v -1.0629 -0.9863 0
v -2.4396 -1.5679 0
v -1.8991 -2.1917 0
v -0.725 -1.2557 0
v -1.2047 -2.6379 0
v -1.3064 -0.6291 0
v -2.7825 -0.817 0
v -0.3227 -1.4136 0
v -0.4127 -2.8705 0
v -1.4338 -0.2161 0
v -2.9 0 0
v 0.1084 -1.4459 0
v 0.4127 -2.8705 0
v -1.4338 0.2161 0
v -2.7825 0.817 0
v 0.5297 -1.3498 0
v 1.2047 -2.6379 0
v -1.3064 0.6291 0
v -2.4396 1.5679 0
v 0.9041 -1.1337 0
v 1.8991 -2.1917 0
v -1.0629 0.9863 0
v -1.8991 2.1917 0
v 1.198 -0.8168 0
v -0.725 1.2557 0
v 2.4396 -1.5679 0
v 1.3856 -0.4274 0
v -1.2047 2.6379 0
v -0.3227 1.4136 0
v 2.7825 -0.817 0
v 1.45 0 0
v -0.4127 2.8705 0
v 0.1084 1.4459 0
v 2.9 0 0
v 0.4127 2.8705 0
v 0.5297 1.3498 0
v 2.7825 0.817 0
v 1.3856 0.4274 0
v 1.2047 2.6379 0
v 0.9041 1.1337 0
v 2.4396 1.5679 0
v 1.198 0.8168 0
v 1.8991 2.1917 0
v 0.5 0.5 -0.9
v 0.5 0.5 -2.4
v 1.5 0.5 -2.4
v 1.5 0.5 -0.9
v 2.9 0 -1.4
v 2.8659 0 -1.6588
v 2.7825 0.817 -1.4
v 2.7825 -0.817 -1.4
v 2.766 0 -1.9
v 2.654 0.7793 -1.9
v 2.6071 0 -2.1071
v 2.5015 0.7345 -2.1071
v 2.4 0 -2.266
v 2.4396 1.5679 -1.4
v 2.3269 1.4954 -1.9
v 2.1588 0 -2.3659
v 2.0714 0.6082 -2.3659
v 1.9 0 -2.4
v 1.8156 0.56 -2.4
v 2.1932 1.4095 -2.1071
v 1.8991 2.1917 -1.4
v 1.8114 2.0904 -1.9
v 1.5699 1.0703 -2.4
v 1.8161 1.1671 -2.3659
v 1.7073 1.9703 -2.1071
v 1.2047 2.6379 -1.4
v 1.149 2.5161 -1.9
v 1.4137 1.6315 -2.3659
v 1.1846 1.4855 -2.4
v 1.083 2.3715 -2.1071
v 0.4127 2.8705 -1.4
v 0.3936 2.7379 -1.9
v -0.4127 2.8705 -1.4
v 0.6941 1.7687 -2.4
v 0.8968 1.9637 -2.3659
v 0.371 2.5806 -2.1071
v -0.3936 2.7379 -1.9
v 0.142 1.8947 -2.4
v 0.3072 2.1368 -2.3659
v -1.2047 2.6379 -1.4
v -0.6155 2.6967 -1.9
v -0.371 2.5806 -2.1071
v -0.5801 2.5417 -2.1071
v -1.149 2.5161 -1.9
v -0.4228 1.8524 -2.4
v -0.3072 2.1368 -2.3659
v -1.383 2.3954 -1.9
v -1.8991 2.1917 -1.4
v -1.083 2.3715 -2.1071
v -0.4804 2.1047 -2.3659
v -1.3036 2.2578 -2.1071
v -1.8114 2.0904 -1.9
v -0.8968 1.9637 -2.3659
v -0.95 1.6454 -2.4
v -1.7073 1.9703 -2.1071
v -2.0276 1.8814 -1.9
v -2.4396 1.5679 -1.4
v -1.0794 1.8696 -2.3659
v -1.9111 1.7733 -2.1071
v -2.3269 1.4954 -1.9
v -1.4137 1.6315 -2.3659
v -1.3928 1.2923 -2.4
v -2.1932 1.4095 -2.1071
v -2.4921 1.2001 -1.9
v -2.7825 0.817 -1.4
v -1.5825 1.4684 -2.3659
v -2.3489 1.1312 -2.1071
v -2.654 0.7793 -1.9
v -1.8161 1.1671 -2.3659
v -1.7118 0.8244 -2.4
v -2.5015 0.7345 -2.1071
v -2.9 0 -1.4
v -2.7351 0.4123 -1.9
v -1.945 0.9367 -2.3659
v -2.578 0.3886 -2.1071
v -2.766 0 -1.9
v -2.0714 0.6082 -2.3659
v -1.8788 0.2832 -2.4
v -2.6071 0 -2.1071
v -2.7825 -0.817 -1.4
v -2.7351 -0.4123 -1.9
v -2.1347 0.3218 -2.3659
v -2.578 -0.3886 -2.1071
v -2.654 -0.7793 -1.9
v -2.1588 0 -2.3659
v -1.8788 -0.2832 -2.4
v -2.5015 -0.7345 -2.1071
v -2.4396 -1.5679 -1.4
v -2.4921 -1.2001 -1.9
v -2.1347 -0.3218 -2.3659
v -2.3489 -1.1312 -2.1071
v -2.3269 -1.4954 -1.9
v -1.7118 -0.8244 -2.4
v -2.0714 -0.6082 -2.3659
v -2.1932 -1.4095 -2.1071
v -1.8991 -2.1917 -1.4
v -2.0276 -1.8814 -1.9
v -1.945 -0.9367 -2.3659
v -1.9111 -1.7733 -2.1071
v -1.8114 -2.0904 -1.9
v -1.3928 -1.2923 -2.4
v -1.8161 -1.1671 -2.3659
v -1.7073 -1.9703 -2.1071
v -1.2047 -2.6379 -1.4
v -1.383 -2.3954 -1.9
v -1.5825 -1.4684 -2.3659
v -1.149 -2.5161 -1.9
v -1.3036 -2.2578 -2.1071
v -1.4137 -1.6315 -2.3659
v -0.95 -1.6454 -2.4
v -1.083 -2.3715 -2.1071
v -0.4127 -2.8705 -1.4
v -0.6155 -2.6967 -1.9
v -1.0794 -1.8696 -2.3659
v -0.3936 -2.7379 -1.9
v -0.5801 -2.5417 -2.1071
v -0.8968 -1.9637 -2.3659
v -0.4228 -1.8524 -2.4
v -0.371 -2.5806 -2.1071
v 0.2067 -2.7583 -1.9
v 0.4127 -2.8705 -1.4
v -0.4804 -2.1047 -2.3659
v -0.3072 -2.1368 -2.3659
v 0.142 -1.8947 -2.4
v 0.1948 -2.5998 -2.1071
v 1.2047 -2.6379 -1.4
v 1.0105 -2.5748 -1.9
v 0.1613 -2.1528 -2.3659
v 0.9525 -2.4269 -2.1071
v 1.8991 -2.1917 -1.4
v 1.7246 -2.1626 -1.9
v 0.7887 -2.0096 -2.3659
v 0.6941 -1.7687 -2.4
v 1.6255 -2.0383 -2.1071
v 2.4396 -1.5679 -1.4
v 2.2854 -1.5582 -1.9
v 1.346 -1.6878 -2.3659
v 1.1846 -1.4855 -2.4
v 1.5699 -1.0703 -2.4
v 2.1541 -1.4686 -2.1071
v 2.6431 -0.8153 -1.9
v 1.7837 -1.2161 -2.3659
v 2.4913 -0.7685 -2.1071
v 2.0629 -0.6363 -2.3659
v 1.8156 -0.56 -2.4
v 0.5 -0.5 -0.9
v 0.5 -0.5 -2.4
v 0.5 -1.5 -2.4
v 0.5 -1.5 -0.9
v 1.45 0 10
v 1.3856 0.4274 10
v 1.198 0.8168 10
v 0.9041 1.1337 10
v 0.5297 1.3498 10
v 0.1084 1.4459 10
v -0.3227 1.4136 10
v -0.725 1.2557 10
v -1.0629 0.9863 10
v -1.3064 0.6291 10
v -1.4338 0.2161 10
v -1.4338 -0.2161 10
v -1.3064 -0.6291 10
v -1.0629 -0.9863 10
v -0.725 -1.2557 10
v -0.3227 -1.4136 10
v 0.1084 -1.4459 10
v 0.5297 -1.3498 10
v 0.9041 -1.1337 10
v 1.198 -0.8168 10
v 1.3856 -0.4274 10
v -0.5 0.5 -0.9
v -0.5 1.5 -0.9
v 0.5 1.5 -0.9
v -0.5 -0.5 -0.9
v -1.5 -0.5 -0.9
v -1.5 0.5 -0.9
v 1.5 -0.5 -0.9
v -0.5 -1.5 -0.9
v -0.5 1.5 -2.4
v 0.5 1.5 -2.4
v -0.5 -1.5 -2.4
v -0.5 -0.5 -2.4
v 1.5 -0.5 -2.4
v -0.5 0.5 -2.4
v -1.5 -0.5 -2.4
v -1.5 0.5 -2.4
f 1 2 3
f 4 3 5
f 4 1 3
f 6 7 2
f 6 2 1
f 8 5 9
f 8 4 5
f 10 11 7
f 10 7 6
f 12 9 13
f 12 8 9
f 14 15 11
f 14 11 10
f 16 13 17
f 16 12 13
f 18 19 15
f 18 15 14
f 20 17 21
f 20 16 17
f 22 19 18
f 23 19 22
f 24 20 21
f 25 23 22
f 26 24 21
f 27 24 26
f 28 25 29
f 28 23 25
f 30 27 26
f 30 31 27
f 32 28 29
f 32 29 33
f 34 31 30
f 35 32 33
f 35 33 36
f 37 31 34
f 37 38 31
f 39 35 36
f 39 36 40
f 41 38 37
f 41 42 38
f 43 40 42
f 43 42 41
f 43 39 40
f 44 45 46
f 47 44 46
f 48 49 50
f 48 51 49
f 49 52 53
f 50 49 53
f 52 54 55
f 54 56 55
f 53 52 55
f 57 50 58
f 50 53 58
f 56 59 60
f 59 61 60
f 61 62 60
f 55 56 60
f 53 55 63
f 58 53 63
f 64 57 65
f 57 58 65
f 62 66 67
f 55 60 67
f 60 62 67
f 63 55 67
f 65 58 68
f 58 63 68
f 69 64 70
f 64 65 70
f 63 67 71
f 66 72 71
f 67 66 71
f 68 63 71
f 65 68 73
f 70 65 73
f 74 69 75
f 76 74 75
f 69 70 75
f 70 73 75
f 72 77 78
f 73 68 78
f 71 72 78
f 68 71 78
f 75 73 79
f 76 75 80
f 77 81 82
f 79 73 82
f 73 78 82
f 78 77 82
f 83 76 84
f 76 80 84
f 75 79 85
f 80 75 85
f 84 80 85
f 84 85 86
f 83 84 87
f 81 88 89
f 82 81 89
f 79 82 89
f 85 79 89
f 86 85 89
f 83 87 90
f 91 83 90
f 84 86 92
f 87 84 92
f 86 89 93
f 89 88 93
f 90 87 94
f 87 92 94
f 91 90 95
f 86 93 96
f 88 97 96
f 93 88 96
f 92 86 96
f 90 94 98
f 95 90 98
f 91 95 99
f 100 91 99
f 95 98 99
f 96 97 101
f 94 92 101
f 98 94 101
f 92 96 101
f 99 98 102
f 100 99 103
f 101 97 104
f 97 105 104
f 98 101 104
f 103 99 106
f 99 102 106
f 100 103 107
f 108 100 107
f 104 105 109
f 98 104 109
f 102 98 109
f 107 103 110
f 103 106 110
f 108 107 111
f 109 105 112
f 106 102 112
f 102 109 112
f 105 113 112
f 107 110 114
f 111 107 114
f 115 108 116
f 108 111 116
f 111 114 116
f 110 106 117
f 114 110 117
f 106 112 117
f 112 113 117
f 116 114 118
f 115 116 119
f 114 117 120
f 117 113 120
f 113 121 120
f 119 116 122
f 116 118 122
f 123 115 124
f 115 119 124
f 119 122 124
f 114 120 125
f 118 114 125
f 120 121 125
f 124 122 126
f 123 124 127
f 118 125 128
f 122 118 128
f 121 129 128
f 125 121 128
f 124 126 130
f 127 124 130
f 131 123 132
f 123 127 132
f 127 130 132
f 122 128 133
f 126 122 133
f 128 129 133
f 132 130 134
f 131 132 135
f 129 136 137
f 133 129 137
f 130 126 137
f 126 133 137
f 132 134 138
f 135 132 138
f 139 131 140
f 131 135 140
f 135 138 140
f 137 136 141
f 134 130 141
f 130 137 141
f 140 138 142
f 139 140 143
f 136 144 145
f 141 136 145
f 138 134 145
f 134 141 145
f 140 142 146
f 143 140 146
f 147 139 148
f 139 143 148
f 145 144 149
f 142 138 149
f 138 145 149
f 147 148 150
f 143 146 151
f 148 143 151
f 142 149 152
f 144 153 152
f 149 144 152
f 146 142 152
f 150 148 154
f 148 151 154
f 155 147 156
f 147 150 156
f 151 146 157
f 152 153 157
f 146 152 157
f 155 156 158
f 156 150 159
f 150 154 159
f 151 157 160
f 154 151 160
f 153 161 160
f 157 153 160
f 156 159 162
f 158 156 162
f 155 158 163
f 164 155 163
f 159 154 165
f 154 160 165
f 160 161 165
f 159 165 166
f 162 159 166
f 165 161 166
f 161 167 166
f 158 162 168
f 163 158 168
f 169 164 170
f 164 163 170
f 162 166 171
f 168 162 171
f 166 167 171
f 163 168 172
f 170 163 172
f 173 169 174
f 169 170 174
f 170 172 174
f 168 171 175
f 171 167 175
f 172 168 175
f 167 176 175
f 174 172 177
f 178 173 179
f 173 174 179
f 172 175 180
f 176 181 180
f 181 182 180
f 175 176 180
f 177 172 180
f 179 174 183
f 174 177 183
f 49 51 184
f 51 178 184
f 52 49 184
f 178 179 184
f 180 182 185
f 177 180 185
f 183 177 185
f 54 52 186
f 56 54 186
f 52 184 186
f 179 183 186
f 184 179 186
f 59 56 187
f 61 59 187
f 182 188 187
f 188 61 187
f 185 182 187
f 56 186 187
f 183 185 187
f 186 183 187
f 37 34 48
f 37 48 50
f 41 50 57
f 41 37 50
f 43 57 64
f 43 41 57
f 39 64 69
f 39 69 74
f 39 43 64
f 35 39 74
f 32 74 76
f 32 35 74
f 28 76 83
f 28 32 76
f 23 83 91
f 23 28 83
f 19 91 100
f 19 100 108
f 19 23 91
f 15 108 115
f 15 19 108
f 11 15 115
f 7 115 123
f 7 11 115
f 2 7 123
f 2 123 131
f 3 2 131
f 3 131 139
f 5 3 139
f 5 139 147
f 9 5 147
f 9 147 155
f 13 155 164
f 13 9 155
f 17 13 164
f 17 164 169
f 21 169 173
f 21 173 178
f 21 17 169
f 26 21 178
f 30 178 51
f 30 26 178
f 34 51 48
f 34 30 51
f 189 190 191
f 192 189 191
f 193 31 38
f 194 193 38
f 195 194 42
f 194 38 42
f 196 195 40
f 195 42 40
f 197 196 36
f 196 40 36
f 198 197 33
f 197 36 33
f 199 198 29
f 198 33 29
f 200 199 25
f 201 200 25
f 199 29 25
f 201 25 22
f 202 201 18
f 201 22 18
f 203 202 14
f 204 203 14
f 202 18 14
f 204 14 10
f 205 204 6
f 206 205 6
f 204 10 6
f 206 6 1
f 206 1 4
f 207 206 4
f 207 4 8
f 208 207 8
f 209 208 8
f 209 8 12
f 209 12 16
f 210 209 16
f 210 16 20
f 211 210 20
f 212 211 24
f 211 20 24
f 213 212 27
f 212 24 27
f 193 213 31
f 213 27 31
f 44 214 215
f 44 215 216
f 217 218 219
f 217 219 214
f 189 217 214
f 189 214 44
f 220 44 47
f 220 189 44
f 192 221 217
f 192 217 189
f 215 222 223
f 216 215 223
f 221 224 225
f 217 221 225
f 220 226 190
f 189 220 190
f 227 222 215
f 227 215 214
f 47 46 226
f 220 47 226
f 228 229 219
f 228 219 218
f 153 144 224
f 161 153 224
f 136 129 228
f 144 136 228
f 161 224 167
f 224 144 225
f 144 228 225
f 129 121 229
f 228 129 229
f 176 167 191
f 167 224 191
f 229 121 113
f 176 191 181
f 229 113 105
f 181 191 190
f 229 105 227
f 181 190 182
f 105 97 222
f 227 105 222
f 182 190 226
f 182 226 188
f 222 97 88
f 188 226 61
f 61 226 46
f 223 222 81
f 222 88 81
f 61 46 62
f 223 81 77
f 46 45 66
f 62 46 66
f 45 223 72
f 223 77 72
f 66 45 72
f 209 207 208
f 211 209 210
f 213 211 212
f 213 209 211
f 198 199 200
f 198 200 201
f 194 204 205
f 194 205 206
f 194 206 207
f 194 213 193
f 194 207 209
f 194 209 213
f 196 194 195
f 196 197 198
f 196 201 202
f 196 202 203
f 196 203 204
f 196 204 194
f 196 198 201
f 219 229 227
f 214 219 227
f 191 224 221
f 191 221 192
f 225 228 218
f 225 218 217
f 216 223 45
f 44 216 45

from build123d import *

# Parameters (mm, degrees)
F0_R     = 1.45
F1_DEPTH = 10
F2_R     = 2.9
F3_DEPTH = 2.4
F4_R     = 1
F5_W     = 1
F5_H     = 1
F6_DEPTH = 1.5


with BuildPart() as f1:
    # F0 (on Top) → F1 (new body)
    with BuildSketch(Plane.XY):
        Circle(F0_R)
    extrude(amount=F1_DEPTH)

    # F2 (on Top) → F3 (join)
    with BuildSketch(Plane.XY):
        Circle(F2_R)
    extrude(amount=-F3_DEPTH)

    # F4
    f4_edges = [f1.edges().sort_by_distance(p)[0] for p in [
        (-2.9, 0, -2.4),
    ]]
    fillet(f4_edges, radius=F4_R)

    # F5 (on face) → F6 (cut)
    with BuildSketch(Plane(origin=(0, 0, -2.4), x_dir=(1, 0, 0), z_dir=(0, 0, -1))):
        with Locations((1, 0)):
            Rectangle(F5_W, F5_H)
        Rectangle(F5_W, F5_H)
        with Locations((0, 1)):
            Rectangle(F5_W, F5_H)
        with Locations((-1, 0)):
            Rectangle(F5_W, F5_H)
        with Locations((0, -1)):
            Rectangle(F5_W, F5_H)
    extrude(amount=-F6_DEPTH, mode=Mode.SUBTRACT)


solid = f1.part
